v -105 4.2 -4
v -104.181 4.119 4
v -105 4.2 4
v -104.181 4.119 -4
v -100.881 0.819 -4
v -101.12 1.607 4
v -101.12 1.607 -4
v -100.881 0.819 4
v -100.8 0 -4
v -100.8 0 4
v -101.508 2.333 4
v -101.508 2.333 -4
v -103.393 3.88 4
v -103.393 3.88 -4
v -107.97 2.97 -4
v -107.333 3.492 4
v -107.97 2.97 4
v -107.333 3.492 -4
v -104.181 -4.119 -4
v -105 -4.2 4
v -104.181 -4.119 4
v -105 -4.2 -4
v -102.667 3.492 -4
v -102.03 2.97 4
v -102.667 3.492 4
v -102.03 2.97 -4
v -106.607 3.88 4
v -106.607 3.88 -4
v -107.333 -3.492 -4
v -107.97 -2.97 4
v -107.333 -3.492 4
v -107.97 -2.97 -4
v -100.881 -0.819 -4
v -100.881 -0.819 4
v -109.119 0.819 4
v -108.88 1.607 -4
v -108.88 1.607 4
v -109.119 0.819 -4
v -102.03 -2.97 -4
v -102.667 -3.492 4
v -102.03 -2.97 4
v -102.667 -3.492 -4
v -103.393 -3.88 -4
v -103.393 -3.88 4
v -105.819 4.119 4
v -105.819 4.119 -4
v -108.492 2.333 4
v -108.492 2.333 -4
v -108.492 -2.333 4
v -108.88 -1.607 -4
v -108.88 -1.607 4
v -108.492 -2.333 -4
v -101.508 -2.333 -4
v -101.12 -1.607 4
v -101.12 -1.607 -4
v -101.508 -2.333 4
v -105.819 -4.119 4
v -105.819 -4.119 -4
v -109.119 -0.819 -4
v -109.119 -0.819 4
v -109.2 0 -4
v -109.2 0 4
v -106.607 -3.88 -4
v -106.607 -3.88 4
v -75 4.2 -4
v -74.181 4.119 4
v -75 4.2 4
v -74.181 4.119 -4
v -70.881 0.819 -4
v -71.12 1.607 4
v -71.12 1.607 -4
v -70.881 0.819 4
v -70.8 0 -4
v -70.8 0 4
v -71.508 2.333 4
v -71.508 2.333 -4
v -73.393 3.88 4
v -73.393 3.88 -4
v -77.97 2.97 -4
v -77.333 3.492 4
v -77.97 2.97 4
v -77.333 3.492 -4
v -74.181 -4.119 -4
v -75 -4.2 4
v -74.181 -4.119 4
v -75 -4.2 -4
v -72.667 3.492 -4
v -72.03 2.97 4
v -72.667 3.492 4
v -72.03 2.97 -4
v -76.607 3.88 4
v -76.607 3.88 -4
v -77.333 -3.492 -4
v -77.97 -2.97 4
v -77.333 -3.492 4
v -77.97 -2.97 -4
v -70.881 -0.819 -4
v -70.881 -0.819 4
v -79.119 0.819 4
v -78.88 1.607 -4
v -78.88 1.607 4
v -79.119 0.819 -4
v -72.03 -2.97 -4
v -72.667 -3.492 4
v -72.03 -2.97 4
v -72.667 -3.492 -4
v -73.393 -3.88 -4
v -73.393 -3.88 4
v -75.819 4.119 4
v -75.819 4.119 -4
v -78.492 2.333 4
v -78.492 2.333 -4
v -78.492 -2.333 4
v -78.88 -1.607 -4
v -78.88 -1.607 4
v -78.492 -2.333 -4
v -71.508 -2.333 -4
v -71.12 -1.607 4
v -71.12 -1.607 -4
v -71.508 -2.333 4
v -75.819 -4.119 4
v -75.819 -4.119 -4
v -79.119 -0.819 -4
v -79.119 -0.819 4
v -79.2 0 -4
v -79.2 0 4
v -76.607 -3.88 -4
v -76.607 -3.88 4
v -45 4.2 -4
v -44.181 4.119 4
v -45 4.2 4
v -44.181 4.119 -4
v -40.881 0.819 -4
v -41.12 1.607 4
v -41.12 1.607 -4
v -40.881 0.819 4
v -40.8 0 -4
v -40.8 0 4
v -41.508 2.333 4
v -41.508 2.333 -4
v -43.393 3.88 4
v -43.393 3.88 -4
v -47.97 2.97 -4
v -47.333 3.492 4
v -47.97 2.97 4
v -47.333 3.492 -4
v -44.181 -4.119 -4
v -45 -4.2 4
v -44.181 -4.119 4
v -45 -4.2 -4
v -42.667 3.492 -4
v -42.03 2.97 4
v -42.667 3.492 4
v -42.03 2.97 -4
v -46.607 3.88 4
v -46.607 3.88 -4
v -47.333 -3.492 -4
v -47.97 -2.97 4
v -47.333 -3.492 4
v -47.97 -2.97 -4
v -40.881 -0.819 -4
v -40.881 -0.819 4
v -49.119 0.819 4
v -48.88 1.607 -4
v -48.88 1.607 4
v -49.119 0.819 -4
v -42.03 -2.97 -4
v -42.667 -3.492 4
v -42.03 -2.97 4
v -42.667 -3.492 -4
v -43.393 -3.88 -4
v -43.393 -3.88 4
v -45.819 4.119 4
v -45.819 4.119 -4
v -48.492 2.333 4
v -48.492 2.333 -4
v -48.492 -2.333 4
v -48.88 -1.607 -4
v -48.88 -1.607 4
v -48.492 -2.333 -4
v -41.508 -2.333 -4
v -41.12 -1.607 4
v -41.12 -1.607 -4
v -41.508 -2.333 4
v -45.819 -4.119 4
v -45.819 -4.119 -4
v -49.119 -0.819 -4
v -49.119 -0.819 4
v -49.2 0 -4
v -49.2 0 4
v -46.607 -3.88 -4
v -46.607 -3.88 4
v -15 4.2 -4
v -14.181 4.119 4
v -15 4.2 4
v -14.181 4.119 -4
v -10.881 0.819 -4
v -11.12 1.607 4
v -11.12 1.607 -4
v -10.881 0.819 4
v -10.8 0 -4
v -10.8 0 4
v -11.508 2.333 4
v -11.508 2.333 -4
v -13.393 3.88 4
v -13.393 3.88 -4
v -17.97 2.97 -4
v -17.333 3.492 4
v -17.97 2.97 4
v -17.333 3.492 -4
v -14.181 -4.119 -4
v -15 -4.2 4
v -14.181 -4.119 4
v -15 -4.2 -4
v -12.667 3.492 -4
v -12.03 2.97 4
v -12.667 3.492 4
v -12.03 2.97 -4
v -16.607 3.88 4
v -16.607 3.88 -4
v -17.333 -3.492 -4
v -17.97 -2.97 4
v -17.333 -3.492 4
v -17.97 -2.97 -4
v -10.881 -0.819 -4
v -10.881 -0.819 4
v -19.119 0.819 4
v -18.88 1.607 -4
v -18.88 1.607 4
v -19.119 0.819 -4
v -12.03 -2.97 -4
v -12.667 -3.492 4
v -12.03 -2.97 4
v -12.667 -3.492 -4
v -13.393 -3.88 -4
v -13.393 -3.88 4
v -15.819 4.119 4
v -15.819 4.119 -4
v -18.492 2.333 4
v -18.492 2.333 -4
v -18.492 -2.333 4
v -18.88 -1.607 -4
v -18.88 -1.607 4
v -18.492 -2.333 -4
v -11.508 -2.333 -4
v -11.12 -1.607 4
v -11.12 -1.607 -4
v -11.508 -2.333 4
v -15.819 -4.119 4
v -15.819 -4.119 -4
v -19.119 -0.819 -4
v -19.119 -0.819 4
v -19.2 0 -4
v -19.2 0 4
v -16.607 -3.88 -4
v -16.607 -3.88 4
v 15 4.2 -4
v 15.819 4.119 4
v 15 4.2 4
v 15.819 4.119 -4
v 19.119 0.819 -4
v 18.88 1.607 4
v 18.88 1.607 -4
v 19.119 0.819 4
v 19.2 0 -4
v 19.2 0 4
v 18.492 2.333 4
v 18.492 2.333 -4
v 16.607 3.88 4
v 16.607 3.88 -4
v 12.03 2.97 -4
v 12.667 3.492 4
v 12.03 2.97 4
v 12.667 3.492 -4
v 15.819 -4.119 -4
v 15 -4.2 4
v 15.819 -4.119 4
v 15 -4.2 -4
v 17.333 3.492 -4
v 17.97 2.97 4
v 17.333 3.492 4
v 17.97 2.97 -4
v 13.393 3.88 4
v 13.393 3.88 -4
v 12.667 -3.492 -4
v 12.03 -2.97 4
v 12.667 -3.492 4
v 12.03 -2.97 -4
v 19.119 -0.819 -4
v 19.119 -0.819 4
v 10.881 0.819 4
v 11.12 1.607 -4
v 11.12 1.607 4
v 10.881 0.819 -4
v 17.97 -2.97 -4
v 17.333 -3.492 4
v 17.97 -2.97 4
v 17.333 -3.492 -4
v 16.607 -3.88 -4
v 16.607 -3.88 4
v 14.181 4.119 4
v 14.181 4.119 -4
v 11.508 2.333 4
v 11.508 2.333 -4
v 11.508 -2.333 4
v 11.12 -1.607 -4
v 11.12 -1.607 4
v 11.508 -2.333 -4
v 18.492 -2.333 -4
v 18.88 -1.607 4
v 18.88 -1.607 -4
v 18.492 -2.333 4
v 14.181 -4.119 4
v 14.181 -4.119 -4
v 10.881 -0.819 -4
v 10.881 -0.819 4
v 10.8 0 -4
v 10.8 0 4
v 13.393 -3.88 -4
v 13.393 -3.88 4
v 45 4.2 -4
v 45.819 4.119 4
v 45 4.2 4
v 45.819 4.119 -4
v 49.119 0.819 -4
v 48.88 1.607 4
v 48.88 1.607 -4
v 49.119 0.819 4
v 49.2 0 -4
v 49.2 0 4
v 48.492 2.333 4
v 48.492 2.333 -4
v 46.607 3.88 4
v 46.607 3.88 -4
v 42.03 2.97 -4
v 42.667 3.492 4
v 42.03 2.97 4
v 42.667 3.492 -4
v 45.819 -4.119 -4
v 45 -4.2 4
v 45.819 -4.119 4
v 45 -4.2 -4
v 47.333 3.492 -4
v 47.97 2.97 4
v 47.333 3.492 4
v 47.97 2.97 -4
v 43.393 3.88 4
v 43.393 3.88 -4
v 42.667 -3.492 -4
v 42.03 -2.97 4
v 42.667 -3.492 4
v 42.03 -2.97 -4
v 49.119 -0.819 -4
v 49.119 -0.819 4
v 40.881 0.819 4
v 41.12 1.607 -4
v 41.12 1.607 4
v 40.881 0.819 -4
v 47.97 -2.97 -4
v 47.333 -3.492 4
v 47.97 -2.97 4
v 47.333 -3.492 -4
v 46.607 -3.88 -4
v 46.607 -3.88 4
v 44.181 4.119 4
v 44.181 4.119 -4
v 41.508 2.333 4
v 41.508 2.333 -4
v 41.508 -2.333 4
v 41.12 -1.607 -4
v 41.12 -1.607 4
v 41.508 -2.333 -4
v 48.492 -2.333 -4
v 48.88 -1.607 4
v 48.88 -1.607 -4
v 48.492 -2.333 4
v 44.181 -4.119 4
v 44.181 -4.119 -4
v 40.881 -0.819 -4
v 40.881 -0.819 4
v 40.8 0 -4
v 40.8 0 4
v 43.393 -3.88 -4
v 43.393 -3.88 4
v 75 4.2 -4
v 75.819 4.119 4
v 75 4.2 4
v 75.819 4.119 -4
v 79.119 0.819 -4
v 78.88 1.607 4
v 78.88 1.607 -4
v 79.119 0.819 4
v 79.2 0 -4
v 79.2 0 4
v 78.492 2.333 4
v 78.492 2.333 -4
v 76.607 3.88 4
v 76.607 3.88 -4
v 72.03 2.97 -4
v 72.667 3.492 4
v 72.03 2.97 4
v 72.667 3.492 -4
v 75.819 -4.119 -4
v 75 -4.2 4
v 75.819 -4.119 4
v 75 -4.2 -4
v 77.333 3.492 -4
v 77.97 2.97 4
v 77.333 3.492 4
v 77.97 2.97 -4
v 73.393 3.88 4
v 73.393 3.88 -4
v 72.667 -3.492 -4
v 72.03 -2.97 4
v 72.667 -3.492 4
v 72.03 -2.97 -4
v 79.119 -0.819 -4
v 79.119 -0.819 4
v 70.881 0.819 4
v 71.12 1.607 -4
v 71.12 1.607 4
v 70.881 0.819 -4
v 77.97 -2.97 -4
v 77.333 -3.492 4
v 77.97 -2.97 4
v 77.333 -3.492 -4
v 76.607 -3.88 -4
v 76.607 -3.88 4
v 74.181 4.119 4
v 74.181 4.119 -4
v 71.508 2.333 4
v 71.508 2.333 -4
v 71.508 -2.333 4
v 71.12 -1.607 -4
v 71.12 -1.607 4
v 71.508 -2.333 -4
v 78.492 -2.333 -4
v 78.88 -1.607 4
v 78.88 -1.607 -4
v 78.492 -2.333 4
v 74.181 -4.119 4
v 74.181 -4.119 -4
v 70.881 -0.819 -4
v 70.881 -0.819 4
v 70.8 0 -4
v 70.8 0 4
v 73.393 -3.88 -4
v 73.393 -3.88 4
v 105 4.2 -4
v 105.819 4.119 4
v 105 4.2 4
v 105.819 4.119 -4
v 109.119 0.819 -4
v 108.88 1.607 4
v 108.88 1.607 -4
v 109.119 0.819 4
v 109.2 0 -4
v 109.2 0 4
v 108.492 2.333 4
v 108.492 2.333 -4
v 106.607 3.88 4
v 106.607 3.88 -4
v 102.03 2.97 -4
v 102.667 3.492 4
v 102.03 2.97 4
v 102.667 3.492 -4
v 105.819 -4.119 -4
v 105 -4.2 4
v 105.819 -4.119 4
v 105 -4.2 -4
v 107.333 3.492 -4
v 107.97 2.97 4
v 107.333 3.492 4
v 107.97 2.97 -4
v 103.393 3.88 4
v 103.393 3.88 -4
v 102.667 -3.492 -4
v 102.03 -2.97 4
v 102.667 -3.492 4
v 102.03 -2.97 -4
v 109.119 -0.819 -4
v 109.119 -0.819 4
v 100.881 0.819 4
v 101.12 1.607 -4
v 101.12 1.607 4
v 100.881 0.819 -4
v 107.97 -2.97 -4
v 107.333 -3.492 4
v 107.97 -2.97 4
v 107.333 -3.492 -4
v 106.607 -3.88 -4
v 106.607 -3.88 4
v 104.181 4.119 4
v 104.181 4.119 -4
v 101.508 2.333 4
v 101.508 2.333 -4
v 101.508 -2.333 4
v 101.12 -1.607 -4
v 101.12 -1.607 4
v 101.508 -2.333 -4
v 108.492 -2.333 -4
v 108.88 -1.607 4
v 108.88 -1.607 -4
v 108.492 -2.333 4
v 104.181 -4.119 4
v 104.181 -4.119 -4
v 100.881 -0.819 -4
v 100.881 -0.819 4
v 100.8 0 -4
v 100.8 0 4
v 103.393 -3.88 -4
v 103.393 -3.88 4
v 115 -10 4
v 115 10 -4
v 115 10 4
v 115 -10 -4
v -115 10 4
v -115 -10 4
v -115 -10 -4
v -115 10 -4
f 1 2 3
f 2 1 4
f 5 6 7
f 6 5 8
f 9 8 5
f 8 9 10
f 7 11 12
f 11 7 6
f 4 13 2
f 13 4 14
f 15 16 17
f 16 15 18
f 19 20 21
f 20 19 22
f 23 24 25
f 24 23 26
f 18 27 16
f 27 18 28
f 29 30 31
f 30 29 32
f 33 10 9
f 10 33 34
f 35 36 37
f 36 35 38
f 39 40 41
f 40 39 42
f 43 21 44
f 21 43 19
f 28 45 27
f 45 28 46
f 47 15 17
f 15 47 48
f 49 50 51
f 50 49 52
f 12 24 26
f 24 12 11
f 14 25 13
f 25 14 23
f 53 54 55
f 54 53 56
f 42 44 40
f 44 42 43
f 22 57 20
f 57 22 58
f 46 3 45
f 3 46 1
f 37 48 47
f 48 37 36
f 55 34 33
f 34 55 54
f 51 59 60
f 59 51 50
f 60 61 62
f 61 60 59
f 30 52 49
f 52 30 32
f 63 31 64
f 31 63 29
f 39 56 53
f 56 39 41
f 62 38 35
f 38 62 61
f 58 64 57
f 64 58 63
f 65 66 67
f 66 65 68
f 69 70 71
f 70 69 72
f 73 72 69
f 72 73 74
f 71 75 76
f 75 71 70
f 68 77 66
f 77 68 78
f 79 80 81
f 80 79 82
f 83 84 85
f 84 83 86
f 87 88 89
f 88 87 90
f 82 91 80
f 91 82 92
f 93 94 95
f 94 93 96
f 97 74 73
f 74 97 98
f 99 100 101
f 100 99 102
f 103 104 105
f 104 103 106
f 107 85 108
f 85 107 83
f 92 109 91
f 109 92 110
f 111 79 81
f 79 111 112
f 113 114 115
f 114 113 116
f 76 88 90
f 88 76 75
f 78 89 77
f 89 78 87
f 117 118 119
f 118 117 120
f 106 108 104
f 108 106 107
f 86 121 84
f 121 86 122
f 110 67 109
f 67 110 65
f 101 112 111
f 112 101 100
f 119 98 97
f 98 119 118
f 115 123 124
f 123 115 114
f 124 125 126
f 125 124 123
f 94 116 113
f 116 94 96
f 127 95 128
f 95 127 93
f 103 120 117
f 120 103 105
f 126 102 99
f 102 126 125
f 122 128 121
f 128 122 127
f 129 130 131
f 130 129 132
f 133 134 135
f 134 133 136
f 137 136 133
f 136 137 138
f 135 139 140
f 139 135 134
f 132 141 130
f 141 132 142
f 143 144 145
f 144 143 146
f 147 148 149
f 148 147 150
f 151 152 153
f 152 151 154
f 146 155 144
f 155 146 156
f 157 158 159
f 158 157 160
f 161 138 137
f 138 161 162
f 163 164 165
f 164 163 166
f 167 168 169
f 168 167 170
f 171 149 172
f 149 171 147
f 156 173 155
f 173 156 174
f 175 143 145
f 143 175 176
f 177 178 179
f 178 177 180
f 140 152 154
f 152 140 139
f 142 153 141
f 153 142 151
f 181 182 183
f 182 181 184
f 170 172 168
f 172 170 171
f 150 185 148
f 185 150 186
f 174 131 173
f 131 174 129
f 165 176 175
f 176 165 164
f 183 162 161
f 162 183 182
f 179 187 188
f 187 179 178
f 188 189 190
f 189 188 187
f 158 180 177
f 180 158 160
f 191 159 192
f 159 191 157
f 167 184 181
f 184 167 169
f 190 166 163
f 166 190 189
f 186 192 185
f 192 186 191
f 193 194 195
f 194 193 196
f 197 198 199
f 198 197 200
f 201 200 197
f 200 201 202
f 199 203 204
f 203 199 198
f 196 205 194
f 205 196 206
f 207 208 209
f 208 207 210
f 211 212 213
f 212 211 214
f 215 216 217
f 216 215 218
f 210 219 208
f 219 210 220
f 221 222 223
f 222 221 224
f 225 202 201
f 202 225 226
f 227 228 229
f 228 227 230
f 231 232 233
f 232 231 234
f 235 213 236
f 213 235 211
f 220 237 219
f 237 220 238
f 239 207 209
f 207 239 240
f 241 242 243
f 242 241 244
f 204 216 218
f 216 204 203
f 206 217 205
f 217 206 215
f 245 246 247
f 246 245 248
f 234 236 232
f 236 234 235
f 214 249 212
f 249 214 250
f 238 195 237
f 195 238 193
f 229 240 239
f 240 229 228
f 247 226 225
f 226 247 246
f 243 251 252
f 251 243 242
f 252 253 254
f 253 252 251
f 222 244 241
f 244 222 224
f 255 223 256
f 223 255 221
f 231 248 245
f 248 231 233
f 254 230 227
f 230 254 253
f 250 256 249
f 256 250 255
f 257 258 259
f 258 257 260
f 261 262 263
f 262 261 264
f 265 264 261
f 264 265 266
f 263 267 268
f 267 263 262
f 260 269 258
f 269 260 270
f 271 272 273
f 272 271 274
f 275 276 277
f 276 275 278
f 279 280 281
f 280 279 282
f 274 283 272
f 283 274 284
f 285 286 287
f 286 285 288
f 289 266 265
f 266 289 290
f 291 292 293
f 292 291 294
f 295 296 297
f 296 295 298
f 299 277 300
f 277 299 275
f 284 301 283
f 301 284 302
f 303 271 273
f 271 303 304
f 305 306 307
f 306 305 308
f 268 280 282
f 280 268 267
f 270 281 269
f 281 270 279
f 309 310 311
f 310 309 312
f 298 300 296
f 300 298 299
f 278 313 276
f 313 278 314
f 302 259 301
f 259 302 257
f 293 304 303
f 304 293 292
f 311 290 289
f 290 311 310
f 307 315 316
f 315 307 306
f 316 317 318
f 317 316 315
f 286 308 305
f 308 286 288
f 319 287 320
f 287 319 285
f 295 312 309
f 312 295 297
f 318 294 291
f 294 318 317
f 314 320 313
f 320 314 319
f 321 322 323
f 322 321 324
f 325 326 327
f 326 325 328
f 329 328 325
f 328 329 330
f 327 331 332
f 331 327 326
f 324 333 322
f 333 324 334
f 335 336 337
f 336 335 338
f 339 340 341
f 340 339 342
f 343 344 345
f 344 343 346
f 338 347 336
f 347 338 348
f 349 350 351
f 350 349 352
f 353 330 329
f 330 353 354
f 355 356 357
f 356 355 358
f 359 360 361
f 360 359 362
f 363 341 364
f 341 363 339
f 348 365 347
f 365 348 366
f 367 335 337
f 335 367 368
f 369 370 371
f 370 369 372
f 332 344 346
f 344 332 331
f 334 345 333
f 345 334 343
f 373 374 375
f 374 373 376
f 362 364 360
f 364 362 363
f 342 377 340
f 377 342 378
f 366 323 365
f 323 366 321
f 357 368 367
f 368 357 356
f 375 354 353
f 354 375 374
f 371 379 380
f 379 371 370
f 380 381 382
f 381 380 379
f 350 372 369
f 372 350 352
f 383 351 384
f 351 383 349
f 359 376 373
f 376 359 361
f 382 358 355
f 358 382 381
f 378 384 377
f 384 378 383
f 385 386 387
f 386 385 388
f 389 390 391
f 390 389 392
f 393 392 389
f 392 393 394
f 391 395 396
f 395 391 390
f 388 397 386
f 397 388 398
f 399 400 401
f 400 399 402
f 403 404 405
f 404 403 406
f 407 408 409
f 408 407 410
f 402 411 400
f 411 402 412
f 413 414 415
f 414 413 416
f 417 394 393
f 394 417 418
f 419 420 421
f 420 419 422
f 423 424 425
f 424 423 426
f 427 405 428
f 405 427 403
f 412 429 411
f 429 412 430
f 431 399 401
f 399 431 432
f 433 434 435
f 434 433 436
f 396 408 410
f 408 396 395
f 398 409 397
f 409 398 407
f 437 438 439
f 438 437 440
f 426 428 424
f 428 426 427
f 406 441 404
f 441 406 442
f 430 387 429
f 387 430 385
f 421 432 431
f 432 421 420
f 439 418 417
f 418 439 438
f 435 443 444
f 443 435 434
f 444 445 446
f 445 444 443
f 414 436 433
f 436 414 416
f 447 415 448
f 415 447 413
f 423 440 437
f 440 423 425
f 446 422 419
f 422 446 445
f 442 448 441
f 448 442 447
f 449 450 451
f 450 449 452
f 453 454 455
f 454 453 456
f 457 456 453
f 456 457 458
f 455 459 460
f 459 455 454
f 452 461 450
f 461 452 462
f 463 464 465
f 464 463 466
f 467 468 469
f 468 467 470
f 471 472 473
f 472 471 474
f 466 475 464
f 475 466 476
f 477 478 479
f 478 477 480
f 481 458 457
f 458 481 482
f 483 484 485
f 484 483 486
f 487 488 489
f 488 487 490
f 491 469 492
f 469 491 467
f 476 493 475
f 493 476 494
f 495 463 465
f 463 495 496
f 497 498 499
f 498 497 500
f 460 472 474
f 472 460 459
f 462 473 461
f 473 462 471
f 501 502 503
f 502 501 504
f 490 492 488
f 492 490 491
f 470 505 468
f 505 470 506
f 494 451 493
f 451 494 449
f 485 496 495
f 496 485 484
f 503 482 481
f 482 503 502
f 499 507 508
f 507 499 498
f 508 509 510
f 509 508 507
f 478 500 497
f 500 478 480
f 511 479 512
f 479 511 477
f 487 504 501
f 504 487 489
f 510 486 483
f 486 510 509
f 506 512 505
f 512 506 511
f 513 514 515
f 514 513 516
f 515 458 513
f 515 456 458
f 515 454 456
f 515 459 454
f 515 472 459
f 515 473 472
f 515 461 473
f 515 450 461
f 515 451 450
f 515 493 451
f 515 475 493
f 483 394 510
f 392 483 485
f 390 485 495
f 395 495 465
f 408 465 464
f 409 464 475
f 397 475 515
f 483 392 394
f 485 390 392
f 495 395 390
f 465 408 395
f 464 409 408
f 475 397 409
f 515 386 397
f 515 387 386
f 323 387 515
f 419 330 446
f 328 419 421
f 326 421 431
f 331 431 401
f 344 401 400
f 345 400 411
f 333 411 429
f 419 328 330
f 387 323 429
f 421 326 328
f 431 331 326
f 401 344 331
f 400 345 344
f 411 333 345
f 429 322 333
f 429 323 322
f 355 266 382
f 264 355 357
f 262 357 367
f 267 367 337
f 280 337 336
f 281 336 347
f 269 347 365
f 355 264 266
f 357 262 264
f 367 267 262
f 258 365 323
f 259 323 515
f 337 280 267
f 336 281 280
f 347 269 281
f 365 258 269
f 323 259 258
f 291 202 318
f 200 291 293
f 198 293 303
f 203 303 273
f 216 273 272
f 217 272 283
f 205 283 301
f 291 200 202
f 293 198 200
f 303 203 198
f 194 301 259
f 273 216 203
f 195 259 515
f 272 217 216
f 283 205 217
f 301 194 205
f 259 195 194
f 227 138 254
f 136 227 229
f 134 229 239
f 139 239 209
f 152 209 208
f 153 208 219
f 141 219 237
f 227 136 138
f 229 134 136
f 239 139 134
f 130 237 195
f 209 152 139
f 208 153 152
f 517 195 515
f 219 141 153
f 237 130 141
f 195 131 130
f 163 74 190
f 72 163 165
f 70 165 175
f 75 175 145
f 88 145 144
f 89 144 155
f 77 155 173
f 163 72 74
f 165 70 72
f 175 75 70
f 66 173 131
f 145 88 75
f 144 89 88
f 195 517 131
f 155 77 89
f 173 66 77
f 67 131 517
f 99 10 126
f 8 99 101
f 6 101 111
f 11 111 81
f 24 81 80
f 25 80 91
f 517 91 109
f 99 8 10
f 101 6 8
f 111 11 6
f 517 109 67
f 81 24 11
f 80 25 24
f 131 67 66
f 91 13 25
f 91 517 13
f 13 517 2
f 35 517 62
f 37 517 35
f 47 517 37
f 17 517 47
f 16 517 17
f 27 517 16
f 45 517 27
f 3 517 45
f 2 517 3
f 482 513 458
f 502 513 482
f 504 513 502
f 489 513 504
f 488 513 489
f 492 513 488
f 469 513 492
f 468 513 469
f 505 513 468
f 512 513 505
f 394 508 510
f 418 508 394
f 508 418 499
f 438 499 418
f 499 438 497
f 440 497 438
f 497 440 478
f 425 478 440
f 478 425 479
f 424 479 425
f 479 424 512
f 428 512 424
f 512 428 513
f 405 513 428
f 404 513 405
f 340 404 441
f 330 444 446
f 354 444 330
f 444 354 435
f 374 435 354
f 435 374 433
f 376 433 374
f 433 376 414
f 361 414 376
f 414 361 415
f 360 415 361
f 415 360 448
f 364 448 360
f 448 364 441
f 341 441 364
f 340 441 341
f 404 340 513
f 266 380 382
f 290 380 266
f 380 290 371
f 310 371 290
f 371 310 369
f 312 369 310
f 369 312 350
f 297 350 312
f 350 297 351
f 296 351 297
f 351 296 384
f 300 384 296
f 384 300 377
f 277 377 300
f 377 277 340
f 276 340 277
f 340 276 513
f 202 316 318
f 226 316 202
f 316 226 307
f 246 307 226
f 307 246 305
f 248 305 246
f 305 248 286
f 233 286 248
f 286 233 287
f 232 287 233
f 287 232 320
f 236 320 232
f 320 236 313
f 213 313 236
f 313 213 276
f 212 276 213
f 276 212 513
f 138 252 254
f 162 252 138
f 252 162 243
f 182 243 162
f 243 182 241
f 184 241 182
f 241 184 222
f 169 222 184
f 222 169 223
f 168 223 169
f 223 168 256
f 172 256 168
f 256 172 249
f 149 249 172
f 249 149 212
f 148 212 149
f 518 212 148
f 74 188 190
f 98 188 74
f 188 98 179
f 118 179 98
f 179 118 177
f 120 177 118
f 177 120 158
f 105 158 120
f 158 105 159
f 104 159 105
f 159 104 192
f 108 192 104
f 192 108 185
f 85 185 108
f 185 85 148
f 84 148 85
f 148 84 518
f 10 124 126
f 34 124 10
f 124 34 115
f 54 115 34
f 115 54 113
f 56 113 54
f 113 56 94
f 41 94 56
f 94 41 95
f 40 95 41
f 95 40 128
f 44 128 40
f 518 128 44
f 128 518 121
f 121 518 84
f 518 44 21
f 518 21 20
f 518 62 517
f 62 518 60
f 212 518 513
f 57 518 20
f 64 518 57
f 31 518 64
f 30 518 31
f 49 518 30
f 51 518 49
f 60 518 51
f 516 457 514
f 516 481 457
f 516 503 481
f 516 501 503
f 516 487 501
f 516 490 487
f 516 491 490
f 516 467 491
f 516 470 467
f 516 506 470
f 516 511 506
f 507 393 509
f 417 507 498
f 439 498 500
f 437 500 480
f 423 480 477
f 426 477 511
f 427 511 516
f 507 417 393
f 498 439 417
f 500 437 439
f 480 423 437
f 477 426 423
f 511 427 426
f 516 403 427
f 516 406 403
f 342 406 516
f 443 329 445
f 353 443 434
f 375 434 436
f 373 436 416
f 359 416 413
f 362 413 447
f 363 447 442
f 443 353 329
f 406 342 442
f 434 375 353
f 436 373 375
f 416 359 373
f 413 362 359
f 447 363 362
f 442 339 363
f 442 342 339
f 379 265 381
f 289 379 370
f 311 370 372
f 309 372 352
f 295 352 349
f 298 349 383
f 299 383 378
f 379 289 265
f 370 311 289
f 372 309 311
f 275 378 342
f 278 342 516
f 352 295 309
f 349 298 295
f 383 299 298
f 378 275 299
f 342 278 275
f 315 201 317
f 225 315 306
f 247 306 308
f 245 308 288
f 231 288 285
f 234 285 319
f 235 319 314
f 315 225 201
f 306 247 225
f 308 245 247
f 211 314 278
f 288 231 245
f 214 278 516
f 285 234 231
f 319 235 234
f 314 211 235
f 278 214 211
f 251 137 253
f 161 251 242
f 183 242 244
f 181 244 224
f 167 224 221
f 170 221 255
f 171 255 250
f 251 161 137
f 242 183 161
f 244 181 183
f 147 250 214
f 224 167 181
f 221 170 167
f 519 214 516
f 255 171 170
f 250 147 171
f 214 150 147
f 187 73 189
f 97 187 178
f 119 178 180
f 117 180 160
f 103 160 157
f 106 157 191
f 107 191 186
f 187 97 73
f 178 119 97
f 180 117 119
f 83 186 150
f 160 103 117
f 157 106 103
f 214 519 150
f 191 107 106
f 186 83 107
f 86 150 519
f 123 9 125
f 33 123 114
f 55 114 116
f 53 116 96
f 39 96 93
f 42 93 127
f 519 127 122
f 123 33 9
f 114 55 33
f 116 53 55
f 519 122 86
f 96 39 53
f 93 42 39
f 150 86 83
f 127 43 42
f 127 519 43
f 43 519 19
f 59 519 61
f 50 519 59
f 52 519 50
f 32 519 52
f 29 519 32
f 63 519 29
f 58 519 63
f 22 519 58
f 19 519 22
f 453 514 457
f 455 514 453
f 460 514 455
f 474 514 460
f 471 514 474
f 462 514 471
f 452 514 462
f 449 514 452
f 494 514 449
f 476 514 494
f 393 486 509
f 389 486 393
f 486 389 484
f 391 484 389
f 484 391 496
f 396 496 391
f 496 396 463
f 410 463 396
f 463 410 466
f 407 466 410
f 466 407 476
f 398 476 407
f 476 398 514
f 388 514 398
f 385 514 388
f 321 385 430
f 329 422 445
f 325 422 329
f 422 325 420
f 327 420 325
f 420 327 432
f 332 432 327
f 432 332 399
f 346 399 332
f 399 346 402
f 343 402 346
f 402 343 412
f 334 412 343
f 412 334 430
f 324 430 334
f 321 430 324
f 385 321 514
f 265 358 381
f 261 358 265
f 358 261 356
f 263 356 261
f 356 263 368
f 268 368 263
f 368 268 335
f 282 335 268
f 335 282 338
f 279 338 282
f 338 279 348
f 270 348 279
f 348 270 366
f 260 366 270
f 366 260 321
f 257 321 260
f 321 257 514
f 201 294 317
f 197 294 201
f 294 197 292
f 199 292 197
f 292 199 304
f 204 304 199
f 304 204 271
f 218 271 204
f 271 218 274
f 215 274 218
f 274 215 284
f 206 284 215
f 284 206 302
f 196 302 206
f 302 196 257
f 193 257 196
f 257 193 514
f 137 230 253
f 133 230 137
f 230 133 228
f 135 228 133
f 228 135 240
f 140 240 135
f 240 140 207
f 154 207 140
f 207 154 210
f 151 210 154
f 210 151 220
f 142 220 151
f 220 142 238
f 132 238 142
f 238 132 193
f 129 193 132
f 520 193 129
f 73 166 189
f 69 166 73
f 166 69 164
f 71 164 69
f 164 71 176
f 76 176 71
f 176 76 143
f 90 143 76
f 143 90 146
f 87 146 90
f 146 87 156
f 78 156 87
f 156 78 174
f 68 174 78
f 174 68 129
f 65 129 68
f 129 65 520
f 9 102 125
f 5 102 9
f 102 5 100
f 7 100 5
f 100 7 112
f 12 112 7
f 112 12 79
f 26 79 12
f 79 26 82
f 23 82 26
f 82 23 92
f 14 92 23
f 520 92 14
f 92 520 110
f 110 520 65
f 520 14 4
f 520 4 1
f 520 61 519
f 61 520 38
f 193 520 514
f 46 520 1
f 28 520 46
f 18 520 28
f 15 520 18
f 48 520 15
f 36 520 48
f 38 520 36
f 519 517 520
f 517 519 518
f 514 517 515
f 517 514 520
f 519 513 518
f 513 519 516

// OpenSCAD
$fn = 32;

// ----------------------------------------------------------------------
// Hole bar, 8 x Ø8.4
// row layout, 10 mm edge offset
// ----------------------------------------------------------------------

// --- parameters (mm) ---
bar_w = 20;    // bar width (Y)
bar_t = 8;     // bar thickness (Z)
holes = 8;     // holes per row
hole_d = 8.4;  // hole diameter
edge = 10;     // offset from the bar end to the first hole
pitch = 30;    // pitch between neighbouring holes

// --- derived feature positions (mm) ---
span = (holes - 1) * pitch;   // = 210   distance between the end holes
bar_l = span + 2 * edge;      // = 230   overall bar length
start_x = -bar_l / 2 + edge;  // = -105   X of the first hole
feature_centers = [
  [start_x + 0 * pitch, 0],
  [start_x + 1 * pitch, 0],
  [start_x + 2 * pitch, 0],
  [start_x + 3 * pitch, 0],
  [start_x + 4 * pitch, 0],
  [start_x + 5 * pitch, 0],
  [start_x + 6 * pitch, 0],
  [start_x + 7 * pitch, 0]
];   // hole centres of the first row

// bar with one row of holes, drilled from feature_centers
difference() {
  translate([-bar_l / 2, -bar_w / 2, -bar_t / 2]) cube([bar_l, bar_w, bar_t]);
  for (centre = feature_centers)
    translate([centre[0], centre[1], 0])
      cylinder(d = hole_d, h = bar_t + 2, center = true);
}
